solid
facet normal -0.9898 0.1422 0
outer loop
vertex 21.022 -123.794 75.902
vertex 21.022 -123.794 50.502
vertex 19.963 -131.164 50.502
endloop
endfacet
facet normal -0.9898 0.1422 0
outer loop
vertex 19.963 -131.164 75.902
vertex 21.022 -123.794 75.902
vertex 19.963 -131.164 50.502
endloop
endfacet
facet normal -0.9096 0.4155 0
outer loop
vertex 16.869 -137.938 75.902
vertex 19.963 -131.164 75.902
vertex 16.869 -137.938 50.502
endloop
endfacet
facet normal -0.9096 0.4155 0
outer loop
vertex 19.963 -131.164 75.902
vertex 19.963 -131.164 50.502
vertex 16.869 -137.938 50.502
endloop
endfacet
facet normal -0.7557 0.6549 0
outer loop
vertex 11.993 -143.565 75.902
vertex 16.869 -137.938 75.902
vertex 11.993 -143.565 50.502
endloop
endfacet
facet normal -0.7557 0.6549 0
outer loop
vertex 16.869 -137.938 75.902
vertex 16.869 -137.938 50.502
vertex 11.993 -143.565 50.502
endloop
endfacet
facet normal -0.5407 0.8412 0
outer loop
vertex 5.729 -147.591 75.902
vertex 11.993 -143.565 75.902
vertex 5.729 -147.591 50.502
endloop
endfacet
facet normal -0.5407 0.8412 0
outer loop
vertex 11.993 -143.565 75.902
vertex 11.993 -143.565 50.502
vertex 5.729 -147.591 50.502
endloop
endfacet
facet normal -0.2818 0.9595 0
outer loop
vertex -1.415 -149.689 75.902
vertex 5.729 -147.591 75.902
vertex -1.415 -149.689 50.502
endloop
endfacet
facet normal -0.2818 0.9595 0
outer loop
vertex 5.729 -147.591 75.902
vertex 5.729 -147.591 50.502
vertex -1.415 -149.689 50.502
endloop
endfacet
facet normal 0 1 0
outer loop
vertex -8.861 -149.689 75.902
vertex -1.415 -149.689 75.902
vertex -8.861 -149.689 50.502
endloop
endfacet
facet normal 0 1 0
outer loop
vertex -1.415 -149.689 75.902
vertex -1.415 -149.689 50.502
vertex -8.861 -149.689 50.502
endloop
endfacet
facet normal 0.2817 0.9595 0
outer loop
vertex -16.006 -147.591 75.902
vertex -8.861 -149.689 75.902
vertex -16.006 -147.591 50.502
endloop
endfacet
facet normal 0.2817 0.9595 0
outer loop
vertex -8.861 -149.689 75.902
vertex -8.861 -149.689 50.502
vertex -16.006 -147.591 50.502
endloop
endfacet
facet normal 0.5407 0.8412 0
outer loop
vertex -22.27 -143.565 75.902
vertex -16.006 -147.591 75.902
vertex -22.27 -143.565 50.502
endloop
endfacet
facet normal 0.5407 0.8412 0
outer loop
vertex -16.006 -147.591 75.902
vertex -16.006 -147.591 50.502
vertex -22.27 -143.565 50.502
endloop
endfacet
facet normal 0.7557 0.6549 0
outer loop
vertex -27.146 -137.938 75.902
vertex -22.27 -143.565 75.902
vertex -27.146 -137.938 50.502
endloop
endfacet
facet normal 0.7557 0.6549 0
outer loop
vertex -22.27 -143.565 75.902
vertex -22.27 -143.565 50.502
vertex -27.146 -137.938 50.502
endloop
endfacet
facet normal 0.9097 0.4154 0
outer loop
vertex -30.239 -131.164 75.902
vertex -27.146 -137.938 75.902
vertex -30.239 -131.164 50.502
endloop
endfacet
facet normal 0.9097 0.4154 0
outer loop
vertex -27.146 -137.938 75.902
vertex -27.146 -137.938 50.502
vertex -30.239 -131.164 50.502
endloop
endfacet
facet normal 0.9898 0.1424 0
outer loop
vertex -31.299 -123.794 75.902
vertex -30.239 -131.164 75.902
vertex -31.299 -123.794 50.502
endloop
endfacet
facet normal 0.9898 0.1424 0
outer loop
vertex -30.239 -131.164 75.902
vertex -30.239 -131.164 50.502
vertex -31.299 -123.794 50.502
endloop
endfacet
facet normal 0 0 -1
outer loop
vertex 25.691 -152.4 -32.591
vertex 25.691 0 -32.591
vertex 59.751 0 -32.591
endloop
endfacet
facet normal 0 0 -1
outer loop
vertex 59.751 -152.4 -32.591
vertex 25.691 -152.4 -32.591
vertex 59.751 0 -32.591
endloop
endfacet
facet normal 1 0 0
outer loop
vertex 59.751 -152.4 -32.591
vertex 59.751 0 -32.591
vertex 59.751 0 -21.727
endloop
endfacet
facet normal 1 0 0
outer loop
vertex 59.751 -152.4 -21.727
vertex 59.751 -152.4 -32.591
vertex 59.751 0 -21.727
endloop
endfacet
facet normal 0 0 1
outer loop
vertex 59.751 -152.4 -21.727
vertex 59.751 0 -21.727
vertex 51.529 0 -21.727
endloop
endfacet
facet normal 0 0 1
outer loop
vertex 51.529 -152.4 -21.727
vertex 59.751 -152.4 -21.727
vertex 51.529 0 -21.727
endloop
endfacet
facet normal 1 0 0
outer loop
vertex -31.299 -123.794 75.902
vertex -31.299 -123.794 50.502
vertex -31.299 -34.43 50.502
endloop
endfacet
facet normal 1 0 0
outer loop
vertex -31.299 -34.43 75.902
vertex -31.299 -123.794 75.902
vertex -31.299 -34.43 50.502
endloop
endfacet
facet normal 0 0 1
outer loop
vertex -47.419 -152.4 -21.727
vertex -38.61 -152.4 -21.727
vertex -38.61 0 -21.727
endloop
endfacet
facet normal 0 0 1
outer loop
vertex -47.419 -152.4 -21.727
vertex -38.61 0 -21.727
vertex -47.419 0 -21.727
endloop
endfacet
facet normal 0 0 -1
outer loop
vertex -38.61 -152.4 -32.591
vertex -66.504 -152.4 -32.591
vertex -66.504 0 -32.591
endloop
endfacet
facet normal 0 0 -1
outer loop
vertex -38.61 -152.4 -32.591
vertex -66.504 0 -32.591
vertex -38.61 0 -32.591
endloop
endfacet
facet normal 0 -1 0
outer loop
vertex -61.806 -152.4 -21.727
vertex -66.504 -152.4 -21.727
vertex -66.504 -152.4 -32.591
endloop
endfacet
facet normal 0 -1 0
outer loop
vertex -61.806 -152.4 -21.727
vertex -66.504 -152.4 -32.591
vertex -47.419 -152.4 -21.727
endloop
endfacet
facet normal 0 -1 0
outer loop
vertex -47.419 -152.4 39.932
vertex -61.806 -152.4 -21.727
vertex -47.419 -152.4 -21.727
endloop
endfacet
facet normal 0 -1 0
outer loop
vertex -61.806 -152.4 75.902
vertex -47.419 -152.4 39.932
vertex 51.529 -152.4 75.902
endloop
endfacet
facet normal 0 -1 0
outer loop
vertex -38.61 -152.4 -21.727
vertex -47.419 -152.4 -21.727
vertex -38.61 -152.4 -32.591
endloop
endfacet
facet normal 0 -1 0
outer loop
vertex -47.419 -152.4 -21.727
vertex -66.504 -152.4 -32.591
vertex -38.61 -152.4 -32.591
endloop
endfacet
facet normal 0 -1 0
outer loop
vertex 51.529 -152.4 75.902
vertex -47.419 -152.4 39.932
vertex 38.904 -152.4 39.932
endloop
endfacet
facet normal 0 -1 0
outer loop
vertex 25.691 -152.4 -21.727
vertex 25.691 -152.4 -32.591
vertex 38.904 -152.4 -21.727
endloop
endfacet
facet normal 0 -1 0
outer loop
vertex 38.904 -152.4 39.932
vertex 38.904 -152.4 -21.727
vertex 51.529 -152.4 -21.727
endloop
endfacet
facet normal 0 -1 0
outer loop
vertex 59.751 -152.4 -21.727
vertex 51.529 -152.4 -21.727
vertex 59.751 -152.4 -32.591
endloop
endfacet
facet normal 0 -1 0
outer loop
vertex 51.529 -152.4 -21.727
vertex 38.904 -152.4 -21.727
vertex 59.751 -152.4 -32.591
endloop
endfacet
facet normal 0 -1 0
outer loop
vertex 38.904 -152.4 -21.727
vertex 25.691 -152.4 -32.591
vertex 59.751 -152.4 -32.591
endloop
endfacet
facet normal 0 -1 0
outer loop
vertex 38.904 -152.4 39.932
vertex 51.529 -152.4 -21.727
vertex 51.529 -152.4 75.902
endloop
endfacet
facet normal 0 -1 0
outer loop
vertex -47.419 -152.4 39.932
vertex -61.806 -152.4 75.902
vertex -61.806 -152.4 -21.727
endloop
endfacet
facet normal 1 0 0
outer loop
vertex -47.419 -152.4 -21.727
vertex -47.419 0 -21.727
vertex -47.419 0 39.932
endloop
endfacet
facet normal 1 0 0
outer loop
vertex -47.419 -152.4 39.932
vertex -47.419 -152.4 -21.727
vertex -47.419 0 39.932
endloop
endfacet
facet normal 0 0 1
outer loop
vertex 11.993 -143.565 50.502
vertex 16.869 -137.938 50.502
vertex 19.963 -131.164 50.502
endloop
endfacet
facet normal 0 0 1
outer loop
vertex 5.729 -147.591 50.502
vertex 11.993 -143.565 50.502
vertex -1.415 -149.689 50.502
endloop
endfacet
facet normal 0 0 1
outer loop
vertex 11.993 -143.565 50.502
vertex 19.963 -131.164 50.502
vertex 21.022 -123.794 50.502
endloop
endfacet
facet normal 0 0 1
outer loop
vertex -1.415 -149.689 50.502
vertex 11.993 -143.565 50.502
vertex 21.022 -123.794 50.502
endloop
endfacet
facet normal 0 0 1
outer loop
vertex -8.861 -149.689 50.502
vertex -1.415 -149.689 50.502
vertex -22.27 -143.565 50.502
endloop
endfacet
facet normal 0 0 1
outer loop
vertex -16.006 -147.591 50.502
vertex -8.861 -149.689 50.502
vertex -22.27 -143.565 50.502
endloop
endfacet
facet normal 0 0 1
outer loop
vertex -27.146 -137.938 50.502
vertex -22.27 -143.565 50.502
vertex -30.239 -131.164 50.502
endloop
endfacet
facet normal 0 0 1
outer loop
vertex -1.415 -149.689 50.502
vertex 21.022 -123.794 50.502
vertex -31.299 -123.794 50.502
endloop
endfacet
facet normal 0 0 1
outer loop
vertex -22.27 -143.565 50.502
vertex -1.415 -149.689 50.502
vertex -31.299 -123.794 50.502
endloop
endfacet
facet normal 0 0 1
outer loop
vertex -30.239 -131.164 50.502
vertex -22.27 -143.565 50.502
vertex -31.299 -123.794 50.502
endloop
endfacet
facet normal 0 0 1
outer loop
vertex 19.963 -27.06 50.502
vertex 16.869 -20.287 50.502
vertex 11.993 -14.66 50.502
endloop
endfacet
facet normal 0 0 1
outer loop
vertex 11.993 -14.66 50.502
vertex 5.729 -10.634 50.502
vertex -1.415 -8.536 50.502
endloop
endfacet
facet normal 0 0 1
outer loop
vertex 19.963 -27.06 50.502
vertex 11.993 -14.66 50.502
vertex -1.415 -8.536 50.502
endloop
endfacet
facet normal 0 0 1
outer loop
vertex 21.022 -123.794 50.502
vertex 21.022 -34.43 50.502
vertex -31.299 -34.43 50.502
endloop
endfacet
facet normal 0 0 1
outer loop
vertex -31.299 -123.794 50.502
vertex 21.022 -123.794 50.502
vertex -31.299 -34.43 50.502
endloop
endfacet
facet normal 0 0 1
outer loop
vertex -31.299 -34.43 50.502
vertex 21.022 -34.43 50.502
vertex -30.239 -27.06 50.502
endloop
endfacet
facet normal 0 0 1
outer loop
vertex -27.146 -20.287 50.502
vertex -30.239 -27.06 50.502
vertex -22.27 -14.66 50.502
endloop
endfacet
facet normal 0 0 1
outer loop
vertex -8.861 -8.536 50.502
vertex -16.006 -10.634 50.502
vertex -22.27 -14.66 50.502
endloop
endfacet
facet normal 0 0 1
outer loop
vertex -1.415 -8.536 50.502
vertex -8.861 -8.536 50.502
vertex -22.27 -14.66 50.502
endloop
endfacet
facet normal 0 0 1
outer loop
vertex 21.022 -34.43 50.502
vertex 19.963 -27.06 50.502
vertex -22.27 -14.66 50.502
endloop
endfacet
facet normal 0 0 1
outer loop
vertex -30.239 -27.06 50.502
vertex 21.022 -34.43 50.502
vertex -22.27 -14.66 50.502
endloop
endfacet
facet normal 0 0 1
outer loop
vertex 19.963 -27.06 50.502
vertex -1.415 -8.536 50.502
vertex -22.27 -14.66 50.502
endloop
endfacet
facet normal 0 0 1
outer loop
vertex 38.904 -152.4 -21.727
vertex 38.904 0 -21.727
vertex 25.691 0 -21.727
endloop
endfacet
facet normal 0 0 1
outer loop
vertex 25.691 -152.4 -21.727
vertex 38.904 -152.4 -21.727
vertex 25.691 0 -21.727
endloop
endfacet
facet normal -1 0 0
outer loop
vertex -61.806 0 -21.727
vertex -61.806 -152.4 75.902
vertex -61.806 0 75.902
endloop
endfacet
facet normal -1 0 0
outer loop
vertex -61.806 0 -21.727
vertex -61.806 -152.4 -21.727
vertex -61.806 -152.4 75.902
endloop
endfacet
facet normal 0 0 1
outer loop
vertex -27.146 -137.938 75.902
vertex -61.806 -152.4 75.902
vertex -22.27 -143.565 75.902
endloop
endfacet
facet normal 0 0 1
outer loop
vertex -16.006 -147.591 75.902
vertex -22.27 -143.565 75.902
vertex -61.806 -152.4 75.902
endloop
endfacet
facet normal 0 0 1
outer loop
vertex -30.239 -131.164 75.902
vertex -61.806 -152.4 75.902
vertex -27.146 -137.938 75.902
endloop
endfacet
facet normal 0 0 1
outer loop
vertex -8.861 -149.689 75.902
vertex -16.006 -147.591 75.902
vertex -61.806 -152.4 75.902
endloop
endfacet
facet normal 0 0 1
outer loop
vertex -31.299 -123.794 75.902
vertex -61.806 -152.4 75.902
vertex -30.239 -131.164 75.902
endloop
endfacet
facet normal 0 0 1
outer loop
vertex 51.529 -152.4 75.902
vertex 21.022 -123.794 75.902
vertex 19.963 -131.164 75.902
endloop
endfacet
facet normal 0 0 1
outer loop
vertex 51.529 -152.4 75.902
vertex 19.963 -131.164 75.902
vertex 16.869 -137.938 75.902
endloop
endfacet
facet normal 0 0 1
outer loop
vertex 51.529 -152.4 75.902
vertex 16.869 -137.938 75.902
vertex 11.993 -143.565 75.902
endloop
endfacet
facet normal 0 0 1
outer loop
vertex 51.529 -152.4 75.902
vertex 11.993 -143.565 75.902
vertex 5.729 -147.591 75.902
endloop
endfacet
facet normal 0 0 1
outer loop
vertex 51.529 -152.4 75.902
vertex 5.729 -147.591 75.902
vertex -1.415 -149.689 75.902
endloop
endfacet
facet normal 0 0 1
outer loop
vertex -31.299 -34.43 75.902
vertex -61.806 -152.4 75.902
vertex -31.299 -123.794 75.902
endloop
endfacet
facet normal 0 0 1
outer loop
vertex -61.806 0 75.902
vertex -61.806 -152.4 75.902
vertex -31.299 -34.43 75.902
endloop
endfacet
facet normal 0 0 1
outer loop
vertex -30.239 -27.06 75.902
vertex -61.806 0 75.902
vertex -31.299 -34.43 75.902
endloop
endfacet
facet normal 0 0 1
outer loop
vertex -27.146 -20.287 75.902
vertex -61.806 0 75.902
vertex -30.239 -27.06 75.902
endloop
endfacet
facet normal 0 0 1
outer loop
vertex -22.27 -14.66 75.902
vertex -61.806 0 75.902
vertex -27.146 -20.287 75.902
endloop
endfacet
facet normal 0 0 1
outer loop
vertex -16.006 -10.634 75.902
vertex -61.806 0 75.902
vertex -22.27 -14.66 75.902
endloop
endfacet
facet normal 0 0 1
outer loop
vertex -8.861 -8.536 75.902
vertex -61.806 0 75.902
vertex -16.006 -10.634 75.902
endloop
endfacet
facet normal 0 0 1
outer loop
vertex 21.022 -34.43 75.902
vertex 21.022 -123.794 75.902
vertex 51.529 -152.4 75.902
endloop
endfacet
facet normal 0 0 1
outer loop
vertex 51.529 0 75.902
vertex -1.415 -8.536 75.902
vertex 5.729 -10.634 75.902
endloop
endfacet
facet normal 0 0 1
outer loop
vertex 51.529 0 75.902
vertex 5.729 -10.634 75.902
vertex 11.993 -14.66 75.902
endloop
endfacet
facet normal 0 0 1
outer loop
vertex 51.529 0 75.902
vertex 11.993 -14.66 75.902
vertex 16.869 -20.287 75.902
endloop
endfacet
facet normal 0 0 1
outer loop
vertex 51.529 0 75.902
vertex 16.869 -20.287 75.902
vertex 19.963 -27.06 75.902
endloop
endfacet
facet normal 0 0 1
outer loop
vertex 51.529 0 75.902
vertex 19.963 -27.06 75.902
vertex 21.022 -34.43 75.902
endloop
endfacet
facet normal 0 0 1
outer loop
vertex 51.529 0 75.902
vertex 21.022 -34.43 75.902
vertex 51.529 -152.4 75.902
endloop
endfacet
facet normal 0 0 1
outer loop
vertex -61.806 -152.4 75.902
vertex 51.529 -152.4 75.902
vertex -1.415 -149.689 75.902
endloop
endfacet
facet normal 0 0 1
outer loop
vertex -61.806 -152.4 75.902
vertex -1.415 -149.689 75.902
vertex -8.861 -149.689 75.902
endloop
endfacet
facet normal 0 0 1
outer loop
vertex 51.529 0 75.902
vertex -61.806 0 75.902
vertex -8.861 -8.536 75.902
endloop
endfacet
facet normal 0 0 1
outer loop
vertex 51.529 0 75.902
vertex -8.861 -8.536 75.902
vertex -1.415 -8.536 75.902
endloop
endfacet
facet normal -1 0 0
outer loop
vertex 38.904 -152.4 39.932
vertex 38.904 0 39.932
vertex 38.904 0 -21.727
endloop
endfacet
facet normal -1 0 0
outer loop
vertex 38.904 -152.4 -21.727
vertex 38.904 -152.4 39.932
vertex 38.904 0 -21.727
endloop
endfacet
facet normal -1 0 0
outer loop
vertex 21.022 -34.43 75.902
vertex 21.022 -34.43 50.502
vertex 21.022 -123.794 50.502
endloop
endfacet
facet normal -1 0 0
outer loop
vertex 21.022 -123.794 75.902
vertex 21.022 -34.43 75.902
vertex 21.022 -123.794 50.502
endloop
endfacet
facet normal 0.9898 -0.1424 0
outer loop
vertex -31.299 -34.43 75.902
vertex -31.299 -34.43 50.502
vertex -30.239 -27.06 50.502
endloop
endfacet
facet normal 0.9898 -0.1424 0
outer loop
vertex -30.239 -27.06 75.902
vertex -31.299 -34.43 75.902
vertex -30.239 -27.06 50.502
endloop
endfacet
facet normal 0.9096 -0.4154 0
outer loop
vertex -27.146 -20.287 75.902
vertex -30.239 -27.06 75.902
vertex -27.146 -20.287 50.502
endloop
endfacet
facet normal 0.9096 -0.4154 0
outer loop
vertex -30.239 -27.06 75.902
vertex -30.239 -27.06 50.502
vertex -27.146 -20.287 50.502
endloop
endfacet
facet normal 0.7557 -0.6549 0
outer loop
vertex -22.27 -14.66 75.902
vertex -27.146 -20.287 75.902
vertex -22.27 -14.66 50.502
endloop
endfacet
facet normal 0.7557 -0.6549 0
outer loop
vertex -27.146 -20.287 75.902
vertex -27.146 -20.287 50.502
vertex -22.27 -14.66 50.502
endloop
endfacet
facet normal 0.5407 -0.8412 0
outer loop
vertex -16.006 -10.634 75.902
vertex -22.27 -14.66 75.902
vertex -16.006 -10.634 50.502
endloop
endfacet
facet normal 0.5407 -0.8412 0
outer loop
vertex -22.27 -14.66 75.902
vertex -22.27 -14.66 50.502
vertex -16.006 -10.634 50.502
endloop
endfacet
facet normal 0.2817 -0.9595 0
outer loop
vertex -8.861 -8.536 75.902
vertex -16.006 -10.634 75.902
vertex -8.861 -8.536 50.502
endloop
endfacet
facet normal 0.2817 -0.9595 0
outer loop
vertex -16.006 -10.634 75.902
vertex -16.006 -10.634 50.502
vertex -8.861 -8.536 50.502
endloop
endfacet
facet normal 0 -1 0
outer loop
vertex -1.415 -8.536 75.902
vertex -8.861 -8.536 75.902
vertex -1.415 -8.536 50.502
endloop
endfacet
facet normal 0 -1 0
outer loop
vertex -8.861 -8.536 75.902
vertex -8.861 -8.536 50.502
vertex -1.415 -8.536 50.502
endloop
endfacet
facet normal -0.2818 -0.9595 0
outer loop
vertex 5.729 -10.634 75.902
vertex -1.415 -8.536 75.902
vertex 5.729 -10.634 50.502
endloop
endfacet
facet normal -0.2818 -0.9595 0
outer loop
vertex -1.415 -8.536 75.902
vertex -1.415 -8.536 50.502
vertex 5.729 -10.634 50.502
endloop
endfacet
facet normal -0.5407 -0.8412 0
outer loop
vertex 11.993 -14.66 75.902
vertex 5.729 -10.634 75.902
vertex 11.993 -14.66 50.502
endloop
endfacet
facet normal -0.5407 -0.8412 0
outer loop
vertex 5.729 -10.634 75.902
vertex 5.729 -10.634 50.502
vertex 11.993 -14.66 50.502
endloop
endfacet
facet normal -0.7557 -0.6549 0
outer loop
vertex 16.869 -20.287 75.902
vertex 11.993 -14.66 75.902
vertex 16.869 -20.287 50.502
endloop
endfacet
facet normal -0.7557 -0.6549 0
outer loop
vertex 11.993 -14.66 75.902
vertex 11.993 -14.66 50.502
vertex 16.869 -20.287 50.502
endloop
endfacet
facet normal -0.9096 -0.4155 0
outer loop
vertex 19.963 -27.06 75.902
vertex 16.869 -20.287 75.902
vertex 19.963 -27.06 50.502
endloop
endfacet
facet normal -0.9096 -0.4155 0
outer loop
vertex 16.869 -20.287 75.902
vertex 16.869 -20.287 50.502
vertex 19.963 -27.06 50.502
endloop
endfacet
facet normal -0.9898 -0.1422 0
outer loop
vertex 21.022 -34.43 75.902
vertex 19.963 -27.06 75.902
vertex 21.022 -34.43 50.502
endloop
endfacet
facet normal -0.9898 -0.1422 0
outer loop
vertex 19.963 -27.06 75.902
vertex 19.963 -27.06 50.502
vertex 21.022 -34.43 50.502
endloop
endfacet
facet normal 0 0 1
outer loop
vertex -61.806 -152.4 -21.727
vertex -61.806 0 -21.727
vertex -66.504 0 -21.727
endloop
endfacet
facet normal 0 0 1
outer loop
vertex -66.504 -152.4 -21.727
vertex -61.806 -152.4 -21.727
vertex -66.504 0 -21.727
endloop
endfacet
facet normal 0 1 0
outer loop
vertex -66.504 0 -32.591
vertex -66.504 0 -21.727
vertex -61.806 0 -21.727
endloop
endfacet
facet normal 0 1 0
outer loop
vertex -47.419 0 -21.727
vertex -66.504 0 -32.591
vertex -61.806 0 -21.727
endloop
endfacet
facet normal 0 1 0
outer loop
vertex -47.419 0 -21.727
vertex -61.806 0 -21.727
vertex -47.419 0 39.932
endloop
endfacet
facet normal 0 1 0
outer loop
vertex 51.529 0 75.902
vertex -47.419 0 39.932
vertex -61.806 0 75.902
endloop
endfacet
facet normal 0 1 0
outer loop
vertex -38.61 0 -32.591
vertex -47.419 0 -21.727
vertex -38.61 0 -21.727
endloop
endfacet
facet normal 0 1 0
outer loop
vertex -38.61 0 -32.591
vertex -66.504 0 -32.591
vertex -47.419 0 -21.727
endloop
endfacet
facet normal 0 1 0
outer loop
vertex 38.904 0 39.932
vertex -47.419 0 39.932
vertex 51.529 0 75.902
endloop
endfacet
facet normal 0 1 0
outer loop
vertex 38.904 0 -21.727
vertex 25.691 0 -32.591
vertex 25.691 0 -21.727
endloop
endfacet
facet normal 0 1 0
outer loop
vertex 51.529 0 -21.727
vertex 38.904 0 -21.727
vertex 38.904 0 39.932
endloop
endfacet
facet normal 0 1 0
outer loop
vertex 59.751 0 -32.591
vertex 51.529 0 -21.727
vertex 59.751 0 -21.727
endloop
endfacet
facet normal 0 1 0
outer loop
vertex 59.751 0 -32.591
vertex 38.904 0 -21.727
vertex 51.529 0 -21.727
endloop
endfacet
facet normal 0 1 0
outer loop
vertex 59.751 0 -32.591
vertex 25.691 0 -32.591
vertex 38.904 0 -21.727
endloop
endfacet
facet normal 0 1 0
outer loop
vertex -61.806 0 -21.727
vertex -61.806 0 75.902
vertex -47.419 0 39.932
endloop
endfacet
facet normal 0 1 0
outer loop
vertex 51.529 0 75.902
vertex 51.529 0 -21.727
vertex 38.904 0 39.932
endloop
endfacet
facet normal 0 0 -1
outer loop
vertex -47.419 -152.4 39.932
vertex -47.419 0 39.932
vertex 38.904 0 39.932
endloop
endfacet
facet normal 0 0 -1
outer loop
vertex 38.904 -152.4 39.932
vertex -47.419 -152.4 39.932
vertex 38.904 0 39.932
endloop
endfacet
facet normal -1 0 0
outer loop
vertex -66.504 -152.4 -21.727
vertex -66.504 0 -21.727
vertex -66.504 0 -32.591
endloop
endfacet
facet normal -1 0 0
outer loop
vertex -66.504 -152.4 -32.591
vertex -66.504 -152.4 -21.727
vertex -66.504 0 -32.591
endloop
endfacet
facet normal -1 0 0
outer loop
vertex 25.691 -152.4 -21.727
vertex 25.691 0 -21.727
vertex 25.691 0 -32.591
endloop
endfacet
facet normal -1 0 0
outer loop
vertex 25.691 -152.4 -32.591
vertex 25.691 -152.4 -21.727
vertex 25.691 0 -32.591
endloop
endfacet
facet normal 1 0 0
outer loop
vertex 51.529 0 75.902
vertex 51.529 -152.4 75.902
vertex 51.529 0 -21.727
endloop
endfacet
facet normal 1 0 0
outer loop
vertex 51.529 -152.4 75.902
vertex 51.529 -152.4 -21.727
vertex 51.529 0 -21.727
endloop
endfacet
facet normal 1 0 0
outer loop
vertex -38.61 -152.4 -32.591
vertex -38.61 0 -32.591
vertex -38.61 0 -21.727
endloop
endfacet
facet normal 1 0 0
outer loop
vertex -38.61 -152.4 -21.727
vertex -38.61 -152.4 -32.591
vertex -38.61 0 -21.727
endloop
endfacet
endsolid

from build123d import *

# Parameters (mm, degrees)
F1_DEPTH = 152.4
F2_W     = 113.335262984
F2_H     = 152.4
F3_DEPTH = 25.4


# Not quite as in the source:
# - a feature names something its author has since deleted; it is built from what else it names


with BuildPart() as f1:
    # F0 (on Front) → F1 (new body)
    with BuildSketch(Plane.XZ):
        Polygon((-61.8058890104, -21.7274855822), (-66.5037259459, -21.7274855822), (-66.5037259459, -32.5912311673), (-38.6103317142, -32.5912311673), (-38.6103317142, -21.7274855822), (-47.4187731743, -21.7274855822), (-47.4187731743, 39.9315953255), (38.9039441943, 39.9315953255), (38.9039441943, -21.7274855822), (25.6912820041, -21.7274855822), (25.6912820041, -32.5912311673), (59.7505830228, -32.5912311673), (59.7505830228, -21.7274855822), (51.5293739736, -21.7274855822), (51.5293739736, 50.5017265677), (-61.8058890104, 50.5017265677), align=None)
    extrude(amount=F1_DEPTH)

    # F2 (on face) → F3 (join)
    with BuildSketch(Plane.XY.offset(50.5017265677)):
        with Locations((-5.1382575184, -76.2)):
            Rectangle(F2_W, F2_H)
        with BuildLine():
            Line((-31.2988758087, -123.7941682339), (-31.2988758087, -34.4304777682))
            ThreePointArc((-31.2988758087, -34.4304777682), (-5.1382575184, -8.2698594779), (21.0223607719, -34.4304777682))
            Line((21.0223607719, -34.4304777682), (21.0223607719, -123.7941682339))
            ThreePointArc((21.0223607719, -123.7941682339), (-5.1382575184, -149.9547865242), (-31.2988758087, -123.7941682339))
        make_face(mode=Mode.SUBTRACT)
    extrude(amount=F3_DEPTH)


solid = f1.part
